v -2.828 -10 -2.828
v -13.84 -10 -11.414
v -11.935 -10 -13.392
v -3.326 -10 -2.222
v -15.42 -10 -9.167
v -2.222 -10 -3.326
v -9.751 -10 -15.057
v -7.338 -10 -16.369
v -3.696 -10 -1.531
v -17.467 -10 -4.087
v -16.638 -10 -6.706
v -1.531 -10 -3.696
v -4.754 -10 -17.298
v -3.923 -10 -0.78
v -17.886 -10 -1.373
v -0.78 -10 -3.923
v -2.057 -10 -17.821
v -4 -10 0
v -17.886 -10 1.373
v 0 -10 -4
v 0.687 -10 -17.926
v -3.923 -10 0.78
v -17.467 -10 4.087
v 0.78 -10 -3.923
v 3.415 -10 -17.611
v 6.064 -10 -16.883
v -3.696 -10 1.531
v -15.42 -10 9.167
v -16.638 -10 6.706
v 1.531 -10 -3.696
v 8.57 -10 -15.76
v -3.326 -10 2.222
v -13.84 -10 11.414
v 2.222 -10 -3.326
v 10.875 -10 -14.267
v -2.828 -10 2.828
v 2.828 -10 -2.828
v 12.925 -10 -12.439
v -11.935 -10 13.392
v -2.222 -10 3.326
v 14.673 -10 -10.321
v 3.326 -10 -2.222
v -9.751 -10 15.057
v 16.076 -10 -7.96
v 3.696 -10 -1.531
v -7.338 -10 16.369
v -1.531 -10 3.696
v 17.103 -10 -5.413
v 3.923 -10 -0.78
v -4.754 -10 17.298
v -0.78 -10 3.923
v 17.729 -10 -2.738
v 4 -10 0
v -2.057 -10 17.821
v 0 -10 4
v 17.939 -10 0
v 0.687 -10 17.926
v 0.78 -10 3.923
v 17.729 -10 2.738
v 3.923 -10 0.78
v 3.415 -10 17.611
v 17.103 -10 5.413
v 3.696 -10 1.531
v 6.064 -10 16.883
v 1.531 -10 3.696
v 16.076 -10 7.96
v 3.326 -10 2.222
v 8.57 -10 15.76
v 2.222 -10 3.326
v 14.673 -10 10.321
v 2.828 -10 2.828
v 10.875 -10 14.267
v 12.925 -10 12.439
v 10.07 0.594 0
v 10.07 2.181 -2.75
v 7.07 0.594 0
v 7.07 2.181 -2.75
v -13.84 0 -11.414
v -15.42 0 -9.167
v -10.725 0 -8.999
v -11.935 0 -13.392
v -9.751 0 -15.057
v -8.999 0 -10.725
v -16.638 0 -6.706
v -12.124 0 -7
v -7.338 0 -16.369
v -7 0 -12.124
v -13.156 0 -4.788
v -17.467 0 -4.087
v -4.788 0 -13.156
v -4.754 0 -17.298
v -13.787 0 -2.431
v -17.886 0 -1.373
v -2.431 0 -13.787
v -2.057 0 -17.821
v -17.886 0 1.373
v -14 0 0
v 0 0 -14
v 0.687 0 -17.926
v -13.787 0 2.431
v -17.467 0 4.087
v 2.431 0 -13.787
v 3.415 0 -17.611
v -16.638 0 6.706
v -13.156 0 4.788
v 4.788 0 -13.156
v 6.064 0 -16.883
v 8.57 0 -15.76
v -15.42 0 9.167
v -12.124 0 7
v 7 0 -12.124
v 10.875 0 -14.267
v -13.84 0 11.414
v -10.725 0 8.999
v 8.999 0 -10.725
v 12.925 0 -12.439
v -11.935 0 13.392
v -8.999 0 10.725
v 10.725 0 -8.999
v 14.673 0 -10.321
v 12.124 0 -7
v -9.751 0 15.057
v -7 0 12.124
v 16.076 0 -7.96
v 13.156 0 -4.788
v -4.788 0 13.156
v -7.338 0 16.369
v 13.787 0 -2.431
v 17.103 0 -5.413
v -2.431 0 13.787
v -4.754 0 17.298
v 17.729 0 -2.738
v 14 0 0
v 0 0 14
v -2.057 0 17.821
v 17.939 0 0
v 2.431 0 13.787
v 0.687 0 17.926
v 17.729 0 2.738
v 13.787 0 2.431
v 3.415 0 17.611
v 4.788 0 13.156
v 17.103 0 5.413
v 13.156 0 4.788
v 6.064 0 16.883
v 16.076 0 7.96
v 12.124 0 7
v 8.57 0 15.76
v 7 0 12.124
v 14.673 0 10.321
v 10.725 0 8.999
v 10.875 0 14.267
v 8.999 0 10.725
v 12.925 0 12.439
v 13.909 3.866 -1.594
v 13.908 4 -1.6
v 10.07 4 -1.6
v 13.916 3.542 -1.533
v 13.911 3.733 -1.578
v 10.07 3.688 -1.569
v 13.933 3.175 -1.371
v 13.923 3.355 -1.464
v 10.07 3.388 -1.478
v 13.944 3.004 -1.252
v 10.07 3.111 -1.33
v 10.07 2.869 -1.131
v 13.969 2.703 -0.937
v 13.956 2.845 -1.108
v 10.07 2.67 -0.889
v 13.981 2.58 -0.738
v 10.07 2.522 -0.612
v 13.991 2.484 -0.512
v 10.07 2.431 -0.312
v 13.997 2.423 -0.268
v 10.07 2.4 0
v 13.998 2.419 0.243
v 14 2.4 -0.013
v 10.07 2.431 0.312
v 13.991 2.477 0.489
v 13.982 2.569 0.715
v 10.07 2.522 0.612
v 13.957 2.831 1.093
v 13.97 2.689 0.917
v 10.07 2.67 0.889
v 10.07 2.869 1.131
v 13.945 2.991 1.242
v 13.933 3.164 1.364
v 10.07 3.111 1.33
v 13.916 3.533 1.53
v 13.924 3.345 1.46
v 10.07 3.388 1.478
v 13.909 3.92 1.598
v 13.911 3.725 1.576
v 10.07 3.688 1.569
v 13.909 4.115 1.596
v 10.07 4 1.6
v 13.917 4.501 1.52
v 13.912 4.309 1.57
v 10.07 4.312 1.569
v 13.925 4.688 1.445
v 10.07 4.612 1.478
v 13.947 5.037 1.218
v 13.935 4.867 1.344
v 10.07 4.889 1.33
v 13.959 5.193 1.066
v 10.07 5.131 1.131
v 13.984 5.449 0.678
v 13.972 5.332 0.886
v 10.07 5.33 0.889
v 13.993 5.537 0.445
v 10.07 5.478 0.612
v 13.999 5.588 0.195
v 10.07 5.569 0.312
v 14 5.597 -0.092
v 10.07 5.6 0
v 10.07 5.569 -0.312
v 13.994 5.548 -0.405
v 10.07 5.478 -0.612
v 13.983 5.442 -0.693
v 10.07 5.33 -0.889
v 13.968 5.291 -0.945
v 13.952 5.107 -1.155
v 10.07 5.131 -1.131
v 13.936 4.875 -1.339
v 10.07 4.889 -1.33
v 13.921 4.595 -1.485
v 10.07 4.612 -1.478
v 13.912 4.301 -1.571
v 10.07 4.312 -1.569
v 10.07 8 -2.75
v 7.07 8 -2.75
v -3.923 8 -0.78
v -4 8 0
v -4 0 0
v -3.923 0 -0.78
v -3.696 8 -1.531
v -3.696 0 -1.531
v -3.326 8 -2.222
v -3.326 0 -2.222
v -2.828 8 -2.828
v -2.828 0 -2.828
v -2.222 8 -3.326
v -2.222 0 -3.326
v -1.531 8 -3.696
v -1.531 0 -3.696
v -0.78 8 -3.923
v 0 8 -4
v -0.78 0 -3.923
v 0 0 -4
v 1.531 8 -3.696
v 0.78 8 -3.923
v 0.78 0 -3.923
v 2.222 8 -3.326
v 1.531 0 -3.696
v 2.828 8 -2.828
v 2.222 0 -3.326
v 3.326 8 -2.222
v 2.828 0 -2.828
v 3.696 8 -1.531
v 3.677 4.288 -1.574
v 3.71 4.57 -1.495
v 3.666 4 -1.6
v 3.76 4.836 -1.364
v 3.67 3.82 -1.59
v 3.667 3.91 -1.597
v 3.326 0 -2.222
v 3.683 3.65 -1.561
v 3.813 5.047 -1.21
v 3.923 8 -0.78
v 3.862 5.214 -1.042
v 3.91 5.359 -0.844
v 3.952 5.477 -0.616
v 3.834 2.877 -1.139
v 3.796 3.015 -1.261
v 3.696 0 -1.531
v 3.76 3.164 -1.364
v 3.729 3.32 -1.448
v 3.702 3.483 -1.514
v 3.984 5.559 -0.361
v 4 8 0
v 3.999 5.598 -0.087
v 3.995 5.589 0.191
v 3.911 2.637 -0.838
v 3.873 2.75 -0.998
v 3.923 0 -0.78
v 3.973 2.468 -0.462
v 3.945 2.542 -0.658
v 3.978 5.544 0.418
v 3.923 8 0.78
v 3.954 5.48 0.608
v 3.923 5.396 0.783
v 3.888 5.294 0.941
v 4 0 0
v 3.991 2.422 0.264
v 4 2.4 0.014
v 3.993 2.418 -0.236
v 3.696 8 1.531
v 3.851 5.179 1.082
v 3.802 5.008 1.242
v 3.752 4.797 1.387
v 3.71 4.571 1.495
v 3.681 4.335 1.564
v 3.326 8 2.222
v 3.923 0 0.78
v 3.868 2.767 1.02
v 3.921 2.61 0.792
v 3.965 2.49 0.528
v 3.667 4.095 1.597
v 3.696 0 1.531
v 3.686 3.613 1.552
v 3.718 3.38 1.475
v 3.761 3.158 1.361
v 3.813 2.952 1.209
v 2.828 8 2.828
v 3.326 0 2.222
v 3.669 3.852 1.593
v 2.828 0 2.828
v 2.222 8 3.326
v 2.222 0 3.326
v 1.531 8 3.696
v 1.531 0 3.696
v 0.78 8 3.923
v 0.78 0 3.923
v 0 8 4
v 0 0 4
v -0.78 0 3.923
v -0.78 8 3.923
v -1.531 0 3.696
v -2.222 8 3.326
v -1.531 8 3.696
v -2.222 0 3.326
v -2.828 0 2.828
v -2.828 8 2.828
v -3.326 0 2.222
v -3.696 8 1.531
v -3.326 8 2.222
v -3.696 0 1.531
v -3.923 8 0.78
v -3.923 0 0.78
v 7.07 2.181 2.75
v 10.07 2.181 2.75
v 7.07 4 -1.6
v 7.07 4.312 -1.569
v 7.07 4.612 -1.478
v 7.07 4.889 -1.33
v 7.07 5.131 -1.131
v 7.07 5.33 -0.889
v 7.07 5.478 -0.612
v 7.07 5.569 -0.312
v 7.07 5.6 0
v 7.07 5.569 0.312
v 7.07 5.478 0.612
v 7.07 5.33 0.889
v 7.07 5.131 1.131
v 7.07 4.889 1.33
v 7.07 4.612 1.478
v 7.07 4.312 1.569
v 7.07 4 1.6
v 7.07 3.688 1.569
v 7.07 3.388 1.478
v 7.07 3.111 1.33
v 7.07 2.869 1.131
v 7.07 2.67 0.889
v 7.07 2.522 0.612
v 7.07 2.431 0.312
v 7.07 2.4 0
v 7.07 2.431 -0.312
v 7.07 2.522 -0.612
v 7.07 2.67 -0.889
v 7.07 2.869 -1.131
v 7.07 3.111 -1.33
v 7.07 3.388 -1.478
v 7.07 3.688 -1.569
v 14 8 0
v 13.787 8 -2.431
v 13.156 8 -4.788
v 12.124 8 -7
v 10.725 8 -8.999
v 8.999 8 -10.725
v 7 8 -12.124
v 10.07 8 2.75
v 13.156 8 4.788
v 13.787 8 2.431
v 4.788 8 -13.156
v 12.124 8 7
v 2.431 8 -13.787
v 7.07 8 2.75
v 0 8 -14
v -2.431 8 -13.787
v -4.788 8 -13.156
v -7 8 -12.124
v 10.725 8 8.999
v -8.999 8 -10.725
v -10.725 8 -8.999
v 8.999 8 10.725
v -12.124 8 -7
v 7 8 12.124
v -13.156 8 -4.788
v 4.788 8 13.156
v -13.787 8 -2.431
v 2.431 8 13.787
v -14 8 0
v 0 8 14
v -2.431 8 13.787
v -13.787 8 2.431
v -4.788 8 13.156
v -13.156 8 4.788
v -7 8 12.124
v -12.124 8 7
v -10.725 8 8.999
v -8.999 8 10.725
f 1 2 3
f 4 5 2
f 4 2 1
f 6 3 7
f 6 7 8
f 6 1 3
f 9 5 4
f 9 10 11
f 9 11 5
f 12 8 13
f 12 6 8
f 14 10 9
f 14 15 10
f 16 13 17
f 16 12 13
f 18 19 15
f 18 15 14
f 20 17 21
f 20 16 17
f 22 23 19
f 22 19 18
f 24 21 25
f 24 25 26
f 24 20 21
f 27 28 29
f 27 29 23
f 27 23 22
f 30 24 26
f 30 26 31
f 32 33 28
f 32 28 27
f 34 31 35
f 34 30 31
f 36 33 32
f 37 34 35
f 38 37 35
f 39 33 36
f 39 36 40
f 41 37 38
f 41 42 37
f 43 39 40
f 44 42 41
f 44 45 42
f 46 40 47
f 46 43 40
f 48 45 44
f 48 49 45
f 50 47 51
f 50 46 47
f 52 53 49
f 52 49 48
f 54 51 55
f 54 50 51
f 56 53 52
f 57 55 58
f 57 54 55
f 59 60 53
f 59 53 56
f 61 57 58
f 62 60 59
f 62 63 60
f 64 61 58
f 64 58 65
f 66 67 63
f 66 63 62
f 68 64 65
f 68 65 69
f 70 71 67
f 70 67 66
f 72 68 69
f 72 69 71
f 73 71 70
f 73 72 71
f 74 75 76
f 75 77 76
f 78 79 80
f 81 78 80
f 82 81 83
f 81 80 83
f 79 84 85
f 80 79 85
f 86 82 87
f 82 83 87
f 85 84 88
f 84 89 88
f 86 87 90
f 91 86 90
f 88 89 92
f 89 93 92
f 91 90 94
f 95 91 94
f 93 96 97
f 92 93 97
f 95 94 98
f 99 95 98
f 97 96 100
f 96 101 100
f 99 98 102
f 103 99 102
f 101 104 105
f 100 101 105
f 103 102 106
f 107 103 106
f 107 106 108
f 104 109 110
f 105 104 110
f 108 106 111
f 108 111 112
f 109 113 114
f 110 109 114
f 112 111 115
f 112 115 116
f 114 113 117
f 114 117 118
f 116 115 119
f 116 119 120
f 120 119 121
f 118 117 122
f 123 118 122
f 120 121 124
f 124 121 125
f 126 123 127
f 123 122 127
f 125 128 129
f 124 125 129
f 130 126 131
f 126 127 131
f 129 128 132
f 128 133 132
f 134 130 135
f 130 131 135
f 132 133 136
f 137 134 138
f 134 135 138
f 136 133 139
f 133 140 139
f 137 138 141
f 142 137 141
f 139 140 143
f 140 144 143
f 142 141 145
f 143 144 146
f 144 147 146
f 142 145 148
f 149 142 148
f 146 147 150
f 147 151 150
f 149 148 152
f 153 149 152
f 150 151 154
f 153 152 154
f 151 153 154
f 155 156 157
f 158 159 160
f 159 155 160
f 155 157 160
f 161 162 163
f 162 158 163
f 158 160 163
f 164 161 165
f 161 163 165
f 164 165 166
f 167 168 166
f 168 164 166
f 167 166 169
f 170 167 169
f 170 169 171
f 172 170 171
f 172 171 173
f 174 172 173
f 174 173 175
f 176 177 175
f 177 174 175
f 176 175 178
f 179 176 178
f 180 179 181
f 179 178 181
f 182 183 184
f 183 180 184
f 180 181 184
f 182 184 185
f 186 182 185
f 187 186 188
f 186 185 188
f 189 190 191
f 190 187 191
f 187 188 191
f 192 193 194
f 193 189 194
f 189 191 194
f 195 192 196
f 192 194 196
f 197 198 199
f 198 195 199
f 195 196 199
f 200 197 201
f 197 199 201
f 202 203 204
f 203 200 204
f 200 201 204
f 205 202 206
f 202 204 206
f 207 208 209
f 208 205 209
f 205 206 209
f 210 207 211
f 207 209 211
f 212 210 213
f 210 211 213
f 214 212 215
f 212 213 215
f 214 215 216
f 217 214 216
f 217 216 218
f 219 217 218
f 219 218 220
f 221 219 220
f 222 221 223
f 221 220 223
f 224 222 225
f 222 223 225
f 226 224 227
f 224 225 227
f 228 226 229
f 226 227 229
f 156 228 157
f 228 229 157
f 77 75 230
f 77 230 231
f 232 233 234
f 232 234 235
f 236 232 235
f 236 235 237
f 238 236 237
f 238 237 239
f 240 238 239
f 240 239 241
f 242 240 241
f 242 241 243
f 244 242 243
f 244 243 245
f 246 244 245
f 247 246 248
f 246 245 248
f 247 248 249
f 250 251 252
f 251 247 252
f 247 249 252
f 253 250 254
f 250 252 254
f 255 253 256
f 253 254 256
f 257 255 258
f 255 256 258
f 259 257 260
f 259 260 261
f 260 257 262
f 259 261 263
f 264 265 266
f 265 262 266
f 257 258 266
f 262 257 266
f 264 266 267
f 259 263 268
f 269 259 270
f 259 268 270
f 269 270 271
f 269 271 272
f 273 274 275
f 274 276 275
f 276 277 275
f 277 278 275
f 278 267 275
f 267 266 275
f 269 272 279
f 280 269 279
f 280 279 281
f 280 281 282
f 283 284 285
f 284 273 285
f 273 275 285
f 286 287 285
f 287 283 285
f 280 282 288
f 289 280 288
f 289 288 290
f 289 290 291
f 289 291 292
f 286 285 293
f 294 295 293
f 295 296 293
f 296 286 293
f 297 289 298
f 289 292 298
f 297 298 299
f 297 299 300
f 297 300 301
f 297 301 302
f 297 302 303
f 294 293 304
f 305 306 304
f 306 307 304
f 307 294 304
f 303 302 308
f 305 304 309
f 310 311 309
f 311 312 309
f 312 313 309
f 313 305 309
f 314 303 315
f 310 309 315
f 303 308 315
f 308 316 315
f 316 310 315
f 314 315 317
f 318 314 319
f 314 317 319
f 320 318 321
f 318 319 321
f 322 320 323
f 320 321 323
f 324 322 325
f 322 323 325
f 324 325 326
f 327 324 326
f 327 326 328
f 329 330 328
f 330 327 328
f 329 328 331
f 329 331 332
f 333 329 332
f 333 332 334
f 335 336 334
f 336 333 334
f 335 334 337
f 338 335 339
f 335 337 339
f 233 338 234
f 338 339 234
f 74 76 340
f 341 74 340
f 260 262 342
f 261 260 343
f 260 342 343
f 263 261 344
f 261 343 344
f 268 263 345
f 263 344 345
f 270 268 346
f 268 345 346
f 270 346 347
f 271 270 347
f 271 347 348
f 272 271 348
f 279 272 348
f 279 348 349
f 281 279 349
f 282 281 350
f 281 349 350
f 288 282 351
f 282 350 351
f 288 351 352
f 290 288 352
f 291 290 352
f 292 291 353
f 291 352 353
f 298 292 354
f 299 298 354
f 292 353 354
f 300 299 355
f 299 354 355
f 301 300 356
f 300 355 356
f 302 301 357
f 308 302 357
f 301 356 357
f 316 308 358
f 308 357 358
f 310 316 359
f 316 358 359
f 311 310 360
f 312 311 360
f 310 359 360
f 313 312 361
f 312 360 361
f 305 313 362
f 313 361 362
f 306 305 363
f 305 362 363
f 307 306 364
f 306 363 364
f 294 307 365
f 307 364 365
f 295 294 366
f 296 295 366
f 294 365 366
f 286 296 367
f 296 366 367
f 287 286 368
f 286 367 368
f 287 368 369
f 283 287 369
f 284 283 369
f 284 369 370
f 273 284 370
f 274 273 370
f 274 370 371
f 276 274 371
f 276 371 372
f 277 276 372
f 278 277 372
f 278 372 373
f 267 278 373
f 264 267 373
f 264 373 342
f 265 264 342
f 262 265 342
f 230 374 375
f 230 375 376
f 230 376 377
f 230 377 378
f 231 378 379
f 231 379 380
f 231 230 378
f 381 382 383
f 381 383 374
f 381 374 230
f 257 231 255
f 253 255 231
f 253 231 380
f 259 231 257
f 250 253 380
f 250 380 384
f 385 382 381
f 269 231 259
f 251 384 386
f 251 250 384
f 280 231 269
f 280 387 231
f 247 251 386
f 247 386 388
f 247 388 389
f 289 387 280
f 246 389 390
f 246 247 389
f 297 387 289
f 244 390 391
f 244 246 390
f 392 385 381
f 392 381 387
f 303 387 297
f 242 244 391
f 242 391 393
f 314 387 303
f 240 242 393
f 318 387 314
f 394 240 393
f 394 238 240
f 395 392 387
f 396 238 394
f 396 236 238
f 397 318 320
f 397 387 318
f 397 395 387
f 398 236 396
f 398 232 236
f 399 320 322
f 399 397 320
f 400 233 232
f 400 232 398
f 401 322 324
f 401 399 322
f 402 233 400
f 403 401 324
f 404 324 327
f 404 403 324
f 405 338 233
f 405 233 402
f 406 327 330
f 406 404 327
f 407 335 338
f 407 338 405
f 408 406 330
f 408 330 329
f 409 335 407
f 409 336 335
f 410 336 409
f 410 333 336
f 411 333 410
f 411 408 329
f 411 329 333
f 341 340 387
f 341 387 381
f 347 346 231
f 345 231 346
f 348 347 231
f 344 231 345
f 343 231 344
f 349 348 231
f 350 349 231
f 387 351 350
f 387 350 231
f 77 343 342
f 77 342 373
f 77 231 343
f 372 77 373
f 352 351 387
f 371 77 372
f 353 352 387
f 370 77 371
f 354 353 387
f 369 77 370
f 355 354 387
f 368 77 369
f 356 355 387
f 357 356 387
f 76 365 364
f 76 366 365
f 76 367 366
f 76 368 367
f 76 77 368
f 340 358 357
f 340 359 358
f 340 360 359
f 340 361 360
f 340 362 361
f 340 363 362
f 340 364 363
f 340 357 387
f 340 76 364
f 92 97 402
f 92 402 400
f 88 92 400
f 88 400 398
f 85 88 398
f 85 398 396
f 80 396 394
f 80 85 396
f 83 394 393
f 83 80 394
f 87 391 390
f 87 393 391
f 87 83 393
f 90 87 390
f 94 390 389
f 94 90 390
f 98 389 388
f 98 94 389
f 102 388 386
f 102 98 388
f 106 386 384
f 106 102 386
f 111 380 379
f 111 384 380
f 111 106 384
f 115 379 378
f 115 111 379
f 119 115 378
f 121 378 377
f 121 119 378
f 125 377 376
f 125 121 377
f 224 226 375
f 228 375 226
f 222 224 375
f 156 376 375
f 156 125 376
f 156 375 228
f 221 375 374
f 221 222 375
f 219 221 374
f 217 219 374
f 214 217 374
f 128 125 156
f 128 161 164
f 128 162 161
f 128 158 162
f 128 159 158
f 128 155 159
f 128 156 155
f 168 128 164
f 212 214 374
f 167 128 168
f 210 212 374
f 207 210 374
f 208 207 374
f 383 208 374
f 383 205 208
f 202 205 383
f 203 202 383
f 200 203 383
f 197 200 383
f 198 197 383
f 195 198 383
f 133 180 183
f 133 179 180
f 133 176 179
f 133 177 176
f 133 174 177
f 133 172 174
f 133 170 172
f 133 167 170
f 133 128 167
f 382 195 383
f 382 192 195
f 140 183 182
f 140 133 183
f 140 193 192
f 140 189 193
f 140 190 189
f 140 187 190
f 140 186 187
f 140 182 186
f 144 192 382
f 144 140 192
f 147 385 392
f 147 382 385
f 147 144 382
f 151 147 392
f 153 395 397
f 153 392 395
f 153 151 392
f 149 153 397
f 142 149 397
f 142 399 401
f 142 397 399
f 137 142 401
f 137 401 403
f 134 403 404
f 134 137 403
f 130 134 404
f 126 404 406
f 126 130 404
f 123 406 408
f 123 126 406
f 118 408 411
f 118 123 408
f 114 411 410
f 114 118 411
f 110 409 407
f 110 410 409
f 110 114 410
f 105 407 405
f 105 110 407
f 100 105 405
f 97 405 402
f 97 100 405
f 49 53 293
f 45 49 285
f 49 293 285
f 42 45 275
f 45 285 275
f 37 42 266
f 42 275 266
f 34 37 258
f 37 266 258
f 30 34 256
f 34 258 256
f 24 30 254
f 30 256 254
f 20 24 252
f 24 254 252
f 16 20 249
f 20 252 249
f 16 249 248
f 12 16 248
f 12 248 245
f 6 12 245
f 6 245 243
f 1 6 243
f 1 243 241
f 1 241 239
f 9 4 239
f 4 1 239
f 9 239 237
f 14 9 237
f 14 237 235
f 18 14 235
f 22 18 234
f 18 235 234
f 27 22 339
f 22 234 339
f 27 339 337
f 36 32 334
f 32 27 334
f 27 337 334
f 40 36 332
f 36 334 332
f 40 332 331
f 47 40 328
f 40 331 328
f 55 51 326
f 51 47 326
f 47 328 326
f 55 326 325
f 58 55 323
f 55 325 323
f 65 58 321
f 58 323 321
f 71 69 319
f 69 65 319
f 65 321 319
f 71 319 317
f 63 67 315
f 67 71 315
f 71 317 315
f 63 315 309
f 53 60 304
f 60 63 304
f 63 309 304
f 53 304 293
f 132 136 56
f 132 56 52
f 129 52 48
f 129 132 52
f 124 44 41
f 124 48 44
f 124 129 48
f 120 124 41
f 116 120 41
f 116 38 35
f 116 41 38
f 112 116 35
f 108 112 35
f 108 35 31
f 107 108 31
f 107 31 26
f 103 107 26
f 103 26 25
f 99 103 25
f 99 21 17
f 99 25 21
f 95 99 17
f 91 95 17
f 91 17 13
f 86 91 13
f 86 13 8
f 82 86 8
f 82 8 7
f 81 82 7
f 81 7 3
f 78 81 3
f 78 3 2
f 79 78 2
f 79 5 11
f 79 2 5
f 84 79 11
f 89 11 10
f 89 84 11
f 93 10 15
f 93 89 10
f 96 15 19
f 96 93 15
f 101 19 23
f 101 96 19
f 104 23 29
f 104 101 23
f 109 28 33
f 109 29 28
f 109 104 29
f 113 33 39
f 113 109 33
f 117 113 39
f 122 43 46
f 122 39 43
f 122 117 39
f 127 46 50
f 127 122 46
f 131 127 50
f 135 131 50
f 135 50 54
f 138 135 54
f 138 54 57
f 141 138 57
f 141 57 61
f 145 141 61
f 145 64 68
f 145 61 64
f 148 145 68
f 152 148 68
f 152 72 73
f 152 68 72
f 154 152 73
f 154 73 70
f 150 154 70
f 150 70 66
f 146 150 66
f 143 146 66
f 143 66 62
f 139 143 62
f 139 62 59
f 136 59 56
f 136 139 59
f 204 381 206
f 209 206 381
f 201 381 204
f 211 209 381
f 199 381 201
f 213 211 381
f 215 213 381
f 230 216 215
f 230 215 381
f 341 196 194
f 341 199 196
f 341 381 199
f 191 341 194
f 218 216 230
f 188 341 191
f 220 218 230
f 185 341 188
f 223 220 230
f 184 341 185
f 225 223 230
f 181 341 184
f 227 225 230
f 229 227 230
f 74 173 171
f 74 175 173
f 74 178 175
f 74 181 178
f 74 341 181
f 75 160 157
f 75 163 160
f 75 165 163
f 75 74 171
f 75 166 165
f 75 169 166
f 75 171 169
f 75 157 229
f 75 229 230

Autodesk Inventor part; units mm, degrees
ref_plane "YZ Plane" through (0, 0, 0) normal (1, 0, 0) x (0, 1, 0)
ref_plane "XZ Plane" through (0, 0, 0) normal (0, 1, 0) x (-1, 0, 0)
ref_plane "XY Plane" through (0, 0, 0) normal (0, 0, 1) x (1, 0, 0)
sketch "Boceto1" plane through (0, 0, 0) normal (0, 1, 0) x (-1, 0, 0)
  circle A0 centre (0, 0) radius 4
  circle A1 centre (0, 0) radius 14
  line L0 (-7.0696, 2.75) -> (-10.0696, 2.75)
  line L1 (-10.0696, 2.75) -> (-10.0696, -2.75)
  line L2 (-10.0696, -2.75) -> (-7.0696, -2.75)
  line L3 (-7.0696, -2.75) -> (-7.0696, 2.75)
  circle A2 centre (0, 0) radius 9 construction
  point P0 (-7.0696, 0)
  point P1 (-8.5696, 2.75)
  dimension "d0" = 8
  dimension "tuerca" = 5.5
  dimension "d2" = 10
  dimension "d3" = 5
  dimension "d4" = 3
extrude "Extrusión1" add sketch "Boceto1" along normal blind 8
sketch "Boceto2" plane through (7.0696, 0, -2.75) normal (1, 0, 0) x (0, 0, -1)
  line L0 (0, 0) -> (-5.5, 0) projected
  line L1 (0, 0) -> (0, 8) construction
  line L2 (-5.5, 8) -> (0, 8) construction
  line L3 (-5.5, 0) -> (-5.5, 8) construction
  line L4 (-5.5, 0) -> (0, 8) construction
  circle A0 centre (-2.75, 4) radius 1.6
  line L5 (0, 2.1813) -> (-2.75, 0.5936)
  line L6 (-2.75, 0.5936) -> (-5.5, 2.1813)
  line L7 (-5.5, 2.1813) -> (-5.5, 0)
  line L8 (0, 2.1813) -> (0, 0)
  point P0 (-2.75, 0)
  dimension "d7" = 3.2
  dimension "d8" = 120
  dimension "d9" = 2.95
extrude "Extrusión2" cut sketch "Boceto2" along normal mid plane 15 contours A0
extrude "Extrusión3" add sketch "Boceto2" along normal up to next contours L0 L7 L6 L5 L8
sketch "Boceto3" plane through (0, 0, 0) normal (0, -1, 0) x (1, 0, 0)
  circle A0 centre (0, 0) radius 4 projected
  circle A1 centre (0, 0) radius 17.939
extrude "Extrusión4" add sketch "Boceto3" along normal blind 10
equation "\"d3\" = 0.5 * d2"
properties part number "poleaT5"
